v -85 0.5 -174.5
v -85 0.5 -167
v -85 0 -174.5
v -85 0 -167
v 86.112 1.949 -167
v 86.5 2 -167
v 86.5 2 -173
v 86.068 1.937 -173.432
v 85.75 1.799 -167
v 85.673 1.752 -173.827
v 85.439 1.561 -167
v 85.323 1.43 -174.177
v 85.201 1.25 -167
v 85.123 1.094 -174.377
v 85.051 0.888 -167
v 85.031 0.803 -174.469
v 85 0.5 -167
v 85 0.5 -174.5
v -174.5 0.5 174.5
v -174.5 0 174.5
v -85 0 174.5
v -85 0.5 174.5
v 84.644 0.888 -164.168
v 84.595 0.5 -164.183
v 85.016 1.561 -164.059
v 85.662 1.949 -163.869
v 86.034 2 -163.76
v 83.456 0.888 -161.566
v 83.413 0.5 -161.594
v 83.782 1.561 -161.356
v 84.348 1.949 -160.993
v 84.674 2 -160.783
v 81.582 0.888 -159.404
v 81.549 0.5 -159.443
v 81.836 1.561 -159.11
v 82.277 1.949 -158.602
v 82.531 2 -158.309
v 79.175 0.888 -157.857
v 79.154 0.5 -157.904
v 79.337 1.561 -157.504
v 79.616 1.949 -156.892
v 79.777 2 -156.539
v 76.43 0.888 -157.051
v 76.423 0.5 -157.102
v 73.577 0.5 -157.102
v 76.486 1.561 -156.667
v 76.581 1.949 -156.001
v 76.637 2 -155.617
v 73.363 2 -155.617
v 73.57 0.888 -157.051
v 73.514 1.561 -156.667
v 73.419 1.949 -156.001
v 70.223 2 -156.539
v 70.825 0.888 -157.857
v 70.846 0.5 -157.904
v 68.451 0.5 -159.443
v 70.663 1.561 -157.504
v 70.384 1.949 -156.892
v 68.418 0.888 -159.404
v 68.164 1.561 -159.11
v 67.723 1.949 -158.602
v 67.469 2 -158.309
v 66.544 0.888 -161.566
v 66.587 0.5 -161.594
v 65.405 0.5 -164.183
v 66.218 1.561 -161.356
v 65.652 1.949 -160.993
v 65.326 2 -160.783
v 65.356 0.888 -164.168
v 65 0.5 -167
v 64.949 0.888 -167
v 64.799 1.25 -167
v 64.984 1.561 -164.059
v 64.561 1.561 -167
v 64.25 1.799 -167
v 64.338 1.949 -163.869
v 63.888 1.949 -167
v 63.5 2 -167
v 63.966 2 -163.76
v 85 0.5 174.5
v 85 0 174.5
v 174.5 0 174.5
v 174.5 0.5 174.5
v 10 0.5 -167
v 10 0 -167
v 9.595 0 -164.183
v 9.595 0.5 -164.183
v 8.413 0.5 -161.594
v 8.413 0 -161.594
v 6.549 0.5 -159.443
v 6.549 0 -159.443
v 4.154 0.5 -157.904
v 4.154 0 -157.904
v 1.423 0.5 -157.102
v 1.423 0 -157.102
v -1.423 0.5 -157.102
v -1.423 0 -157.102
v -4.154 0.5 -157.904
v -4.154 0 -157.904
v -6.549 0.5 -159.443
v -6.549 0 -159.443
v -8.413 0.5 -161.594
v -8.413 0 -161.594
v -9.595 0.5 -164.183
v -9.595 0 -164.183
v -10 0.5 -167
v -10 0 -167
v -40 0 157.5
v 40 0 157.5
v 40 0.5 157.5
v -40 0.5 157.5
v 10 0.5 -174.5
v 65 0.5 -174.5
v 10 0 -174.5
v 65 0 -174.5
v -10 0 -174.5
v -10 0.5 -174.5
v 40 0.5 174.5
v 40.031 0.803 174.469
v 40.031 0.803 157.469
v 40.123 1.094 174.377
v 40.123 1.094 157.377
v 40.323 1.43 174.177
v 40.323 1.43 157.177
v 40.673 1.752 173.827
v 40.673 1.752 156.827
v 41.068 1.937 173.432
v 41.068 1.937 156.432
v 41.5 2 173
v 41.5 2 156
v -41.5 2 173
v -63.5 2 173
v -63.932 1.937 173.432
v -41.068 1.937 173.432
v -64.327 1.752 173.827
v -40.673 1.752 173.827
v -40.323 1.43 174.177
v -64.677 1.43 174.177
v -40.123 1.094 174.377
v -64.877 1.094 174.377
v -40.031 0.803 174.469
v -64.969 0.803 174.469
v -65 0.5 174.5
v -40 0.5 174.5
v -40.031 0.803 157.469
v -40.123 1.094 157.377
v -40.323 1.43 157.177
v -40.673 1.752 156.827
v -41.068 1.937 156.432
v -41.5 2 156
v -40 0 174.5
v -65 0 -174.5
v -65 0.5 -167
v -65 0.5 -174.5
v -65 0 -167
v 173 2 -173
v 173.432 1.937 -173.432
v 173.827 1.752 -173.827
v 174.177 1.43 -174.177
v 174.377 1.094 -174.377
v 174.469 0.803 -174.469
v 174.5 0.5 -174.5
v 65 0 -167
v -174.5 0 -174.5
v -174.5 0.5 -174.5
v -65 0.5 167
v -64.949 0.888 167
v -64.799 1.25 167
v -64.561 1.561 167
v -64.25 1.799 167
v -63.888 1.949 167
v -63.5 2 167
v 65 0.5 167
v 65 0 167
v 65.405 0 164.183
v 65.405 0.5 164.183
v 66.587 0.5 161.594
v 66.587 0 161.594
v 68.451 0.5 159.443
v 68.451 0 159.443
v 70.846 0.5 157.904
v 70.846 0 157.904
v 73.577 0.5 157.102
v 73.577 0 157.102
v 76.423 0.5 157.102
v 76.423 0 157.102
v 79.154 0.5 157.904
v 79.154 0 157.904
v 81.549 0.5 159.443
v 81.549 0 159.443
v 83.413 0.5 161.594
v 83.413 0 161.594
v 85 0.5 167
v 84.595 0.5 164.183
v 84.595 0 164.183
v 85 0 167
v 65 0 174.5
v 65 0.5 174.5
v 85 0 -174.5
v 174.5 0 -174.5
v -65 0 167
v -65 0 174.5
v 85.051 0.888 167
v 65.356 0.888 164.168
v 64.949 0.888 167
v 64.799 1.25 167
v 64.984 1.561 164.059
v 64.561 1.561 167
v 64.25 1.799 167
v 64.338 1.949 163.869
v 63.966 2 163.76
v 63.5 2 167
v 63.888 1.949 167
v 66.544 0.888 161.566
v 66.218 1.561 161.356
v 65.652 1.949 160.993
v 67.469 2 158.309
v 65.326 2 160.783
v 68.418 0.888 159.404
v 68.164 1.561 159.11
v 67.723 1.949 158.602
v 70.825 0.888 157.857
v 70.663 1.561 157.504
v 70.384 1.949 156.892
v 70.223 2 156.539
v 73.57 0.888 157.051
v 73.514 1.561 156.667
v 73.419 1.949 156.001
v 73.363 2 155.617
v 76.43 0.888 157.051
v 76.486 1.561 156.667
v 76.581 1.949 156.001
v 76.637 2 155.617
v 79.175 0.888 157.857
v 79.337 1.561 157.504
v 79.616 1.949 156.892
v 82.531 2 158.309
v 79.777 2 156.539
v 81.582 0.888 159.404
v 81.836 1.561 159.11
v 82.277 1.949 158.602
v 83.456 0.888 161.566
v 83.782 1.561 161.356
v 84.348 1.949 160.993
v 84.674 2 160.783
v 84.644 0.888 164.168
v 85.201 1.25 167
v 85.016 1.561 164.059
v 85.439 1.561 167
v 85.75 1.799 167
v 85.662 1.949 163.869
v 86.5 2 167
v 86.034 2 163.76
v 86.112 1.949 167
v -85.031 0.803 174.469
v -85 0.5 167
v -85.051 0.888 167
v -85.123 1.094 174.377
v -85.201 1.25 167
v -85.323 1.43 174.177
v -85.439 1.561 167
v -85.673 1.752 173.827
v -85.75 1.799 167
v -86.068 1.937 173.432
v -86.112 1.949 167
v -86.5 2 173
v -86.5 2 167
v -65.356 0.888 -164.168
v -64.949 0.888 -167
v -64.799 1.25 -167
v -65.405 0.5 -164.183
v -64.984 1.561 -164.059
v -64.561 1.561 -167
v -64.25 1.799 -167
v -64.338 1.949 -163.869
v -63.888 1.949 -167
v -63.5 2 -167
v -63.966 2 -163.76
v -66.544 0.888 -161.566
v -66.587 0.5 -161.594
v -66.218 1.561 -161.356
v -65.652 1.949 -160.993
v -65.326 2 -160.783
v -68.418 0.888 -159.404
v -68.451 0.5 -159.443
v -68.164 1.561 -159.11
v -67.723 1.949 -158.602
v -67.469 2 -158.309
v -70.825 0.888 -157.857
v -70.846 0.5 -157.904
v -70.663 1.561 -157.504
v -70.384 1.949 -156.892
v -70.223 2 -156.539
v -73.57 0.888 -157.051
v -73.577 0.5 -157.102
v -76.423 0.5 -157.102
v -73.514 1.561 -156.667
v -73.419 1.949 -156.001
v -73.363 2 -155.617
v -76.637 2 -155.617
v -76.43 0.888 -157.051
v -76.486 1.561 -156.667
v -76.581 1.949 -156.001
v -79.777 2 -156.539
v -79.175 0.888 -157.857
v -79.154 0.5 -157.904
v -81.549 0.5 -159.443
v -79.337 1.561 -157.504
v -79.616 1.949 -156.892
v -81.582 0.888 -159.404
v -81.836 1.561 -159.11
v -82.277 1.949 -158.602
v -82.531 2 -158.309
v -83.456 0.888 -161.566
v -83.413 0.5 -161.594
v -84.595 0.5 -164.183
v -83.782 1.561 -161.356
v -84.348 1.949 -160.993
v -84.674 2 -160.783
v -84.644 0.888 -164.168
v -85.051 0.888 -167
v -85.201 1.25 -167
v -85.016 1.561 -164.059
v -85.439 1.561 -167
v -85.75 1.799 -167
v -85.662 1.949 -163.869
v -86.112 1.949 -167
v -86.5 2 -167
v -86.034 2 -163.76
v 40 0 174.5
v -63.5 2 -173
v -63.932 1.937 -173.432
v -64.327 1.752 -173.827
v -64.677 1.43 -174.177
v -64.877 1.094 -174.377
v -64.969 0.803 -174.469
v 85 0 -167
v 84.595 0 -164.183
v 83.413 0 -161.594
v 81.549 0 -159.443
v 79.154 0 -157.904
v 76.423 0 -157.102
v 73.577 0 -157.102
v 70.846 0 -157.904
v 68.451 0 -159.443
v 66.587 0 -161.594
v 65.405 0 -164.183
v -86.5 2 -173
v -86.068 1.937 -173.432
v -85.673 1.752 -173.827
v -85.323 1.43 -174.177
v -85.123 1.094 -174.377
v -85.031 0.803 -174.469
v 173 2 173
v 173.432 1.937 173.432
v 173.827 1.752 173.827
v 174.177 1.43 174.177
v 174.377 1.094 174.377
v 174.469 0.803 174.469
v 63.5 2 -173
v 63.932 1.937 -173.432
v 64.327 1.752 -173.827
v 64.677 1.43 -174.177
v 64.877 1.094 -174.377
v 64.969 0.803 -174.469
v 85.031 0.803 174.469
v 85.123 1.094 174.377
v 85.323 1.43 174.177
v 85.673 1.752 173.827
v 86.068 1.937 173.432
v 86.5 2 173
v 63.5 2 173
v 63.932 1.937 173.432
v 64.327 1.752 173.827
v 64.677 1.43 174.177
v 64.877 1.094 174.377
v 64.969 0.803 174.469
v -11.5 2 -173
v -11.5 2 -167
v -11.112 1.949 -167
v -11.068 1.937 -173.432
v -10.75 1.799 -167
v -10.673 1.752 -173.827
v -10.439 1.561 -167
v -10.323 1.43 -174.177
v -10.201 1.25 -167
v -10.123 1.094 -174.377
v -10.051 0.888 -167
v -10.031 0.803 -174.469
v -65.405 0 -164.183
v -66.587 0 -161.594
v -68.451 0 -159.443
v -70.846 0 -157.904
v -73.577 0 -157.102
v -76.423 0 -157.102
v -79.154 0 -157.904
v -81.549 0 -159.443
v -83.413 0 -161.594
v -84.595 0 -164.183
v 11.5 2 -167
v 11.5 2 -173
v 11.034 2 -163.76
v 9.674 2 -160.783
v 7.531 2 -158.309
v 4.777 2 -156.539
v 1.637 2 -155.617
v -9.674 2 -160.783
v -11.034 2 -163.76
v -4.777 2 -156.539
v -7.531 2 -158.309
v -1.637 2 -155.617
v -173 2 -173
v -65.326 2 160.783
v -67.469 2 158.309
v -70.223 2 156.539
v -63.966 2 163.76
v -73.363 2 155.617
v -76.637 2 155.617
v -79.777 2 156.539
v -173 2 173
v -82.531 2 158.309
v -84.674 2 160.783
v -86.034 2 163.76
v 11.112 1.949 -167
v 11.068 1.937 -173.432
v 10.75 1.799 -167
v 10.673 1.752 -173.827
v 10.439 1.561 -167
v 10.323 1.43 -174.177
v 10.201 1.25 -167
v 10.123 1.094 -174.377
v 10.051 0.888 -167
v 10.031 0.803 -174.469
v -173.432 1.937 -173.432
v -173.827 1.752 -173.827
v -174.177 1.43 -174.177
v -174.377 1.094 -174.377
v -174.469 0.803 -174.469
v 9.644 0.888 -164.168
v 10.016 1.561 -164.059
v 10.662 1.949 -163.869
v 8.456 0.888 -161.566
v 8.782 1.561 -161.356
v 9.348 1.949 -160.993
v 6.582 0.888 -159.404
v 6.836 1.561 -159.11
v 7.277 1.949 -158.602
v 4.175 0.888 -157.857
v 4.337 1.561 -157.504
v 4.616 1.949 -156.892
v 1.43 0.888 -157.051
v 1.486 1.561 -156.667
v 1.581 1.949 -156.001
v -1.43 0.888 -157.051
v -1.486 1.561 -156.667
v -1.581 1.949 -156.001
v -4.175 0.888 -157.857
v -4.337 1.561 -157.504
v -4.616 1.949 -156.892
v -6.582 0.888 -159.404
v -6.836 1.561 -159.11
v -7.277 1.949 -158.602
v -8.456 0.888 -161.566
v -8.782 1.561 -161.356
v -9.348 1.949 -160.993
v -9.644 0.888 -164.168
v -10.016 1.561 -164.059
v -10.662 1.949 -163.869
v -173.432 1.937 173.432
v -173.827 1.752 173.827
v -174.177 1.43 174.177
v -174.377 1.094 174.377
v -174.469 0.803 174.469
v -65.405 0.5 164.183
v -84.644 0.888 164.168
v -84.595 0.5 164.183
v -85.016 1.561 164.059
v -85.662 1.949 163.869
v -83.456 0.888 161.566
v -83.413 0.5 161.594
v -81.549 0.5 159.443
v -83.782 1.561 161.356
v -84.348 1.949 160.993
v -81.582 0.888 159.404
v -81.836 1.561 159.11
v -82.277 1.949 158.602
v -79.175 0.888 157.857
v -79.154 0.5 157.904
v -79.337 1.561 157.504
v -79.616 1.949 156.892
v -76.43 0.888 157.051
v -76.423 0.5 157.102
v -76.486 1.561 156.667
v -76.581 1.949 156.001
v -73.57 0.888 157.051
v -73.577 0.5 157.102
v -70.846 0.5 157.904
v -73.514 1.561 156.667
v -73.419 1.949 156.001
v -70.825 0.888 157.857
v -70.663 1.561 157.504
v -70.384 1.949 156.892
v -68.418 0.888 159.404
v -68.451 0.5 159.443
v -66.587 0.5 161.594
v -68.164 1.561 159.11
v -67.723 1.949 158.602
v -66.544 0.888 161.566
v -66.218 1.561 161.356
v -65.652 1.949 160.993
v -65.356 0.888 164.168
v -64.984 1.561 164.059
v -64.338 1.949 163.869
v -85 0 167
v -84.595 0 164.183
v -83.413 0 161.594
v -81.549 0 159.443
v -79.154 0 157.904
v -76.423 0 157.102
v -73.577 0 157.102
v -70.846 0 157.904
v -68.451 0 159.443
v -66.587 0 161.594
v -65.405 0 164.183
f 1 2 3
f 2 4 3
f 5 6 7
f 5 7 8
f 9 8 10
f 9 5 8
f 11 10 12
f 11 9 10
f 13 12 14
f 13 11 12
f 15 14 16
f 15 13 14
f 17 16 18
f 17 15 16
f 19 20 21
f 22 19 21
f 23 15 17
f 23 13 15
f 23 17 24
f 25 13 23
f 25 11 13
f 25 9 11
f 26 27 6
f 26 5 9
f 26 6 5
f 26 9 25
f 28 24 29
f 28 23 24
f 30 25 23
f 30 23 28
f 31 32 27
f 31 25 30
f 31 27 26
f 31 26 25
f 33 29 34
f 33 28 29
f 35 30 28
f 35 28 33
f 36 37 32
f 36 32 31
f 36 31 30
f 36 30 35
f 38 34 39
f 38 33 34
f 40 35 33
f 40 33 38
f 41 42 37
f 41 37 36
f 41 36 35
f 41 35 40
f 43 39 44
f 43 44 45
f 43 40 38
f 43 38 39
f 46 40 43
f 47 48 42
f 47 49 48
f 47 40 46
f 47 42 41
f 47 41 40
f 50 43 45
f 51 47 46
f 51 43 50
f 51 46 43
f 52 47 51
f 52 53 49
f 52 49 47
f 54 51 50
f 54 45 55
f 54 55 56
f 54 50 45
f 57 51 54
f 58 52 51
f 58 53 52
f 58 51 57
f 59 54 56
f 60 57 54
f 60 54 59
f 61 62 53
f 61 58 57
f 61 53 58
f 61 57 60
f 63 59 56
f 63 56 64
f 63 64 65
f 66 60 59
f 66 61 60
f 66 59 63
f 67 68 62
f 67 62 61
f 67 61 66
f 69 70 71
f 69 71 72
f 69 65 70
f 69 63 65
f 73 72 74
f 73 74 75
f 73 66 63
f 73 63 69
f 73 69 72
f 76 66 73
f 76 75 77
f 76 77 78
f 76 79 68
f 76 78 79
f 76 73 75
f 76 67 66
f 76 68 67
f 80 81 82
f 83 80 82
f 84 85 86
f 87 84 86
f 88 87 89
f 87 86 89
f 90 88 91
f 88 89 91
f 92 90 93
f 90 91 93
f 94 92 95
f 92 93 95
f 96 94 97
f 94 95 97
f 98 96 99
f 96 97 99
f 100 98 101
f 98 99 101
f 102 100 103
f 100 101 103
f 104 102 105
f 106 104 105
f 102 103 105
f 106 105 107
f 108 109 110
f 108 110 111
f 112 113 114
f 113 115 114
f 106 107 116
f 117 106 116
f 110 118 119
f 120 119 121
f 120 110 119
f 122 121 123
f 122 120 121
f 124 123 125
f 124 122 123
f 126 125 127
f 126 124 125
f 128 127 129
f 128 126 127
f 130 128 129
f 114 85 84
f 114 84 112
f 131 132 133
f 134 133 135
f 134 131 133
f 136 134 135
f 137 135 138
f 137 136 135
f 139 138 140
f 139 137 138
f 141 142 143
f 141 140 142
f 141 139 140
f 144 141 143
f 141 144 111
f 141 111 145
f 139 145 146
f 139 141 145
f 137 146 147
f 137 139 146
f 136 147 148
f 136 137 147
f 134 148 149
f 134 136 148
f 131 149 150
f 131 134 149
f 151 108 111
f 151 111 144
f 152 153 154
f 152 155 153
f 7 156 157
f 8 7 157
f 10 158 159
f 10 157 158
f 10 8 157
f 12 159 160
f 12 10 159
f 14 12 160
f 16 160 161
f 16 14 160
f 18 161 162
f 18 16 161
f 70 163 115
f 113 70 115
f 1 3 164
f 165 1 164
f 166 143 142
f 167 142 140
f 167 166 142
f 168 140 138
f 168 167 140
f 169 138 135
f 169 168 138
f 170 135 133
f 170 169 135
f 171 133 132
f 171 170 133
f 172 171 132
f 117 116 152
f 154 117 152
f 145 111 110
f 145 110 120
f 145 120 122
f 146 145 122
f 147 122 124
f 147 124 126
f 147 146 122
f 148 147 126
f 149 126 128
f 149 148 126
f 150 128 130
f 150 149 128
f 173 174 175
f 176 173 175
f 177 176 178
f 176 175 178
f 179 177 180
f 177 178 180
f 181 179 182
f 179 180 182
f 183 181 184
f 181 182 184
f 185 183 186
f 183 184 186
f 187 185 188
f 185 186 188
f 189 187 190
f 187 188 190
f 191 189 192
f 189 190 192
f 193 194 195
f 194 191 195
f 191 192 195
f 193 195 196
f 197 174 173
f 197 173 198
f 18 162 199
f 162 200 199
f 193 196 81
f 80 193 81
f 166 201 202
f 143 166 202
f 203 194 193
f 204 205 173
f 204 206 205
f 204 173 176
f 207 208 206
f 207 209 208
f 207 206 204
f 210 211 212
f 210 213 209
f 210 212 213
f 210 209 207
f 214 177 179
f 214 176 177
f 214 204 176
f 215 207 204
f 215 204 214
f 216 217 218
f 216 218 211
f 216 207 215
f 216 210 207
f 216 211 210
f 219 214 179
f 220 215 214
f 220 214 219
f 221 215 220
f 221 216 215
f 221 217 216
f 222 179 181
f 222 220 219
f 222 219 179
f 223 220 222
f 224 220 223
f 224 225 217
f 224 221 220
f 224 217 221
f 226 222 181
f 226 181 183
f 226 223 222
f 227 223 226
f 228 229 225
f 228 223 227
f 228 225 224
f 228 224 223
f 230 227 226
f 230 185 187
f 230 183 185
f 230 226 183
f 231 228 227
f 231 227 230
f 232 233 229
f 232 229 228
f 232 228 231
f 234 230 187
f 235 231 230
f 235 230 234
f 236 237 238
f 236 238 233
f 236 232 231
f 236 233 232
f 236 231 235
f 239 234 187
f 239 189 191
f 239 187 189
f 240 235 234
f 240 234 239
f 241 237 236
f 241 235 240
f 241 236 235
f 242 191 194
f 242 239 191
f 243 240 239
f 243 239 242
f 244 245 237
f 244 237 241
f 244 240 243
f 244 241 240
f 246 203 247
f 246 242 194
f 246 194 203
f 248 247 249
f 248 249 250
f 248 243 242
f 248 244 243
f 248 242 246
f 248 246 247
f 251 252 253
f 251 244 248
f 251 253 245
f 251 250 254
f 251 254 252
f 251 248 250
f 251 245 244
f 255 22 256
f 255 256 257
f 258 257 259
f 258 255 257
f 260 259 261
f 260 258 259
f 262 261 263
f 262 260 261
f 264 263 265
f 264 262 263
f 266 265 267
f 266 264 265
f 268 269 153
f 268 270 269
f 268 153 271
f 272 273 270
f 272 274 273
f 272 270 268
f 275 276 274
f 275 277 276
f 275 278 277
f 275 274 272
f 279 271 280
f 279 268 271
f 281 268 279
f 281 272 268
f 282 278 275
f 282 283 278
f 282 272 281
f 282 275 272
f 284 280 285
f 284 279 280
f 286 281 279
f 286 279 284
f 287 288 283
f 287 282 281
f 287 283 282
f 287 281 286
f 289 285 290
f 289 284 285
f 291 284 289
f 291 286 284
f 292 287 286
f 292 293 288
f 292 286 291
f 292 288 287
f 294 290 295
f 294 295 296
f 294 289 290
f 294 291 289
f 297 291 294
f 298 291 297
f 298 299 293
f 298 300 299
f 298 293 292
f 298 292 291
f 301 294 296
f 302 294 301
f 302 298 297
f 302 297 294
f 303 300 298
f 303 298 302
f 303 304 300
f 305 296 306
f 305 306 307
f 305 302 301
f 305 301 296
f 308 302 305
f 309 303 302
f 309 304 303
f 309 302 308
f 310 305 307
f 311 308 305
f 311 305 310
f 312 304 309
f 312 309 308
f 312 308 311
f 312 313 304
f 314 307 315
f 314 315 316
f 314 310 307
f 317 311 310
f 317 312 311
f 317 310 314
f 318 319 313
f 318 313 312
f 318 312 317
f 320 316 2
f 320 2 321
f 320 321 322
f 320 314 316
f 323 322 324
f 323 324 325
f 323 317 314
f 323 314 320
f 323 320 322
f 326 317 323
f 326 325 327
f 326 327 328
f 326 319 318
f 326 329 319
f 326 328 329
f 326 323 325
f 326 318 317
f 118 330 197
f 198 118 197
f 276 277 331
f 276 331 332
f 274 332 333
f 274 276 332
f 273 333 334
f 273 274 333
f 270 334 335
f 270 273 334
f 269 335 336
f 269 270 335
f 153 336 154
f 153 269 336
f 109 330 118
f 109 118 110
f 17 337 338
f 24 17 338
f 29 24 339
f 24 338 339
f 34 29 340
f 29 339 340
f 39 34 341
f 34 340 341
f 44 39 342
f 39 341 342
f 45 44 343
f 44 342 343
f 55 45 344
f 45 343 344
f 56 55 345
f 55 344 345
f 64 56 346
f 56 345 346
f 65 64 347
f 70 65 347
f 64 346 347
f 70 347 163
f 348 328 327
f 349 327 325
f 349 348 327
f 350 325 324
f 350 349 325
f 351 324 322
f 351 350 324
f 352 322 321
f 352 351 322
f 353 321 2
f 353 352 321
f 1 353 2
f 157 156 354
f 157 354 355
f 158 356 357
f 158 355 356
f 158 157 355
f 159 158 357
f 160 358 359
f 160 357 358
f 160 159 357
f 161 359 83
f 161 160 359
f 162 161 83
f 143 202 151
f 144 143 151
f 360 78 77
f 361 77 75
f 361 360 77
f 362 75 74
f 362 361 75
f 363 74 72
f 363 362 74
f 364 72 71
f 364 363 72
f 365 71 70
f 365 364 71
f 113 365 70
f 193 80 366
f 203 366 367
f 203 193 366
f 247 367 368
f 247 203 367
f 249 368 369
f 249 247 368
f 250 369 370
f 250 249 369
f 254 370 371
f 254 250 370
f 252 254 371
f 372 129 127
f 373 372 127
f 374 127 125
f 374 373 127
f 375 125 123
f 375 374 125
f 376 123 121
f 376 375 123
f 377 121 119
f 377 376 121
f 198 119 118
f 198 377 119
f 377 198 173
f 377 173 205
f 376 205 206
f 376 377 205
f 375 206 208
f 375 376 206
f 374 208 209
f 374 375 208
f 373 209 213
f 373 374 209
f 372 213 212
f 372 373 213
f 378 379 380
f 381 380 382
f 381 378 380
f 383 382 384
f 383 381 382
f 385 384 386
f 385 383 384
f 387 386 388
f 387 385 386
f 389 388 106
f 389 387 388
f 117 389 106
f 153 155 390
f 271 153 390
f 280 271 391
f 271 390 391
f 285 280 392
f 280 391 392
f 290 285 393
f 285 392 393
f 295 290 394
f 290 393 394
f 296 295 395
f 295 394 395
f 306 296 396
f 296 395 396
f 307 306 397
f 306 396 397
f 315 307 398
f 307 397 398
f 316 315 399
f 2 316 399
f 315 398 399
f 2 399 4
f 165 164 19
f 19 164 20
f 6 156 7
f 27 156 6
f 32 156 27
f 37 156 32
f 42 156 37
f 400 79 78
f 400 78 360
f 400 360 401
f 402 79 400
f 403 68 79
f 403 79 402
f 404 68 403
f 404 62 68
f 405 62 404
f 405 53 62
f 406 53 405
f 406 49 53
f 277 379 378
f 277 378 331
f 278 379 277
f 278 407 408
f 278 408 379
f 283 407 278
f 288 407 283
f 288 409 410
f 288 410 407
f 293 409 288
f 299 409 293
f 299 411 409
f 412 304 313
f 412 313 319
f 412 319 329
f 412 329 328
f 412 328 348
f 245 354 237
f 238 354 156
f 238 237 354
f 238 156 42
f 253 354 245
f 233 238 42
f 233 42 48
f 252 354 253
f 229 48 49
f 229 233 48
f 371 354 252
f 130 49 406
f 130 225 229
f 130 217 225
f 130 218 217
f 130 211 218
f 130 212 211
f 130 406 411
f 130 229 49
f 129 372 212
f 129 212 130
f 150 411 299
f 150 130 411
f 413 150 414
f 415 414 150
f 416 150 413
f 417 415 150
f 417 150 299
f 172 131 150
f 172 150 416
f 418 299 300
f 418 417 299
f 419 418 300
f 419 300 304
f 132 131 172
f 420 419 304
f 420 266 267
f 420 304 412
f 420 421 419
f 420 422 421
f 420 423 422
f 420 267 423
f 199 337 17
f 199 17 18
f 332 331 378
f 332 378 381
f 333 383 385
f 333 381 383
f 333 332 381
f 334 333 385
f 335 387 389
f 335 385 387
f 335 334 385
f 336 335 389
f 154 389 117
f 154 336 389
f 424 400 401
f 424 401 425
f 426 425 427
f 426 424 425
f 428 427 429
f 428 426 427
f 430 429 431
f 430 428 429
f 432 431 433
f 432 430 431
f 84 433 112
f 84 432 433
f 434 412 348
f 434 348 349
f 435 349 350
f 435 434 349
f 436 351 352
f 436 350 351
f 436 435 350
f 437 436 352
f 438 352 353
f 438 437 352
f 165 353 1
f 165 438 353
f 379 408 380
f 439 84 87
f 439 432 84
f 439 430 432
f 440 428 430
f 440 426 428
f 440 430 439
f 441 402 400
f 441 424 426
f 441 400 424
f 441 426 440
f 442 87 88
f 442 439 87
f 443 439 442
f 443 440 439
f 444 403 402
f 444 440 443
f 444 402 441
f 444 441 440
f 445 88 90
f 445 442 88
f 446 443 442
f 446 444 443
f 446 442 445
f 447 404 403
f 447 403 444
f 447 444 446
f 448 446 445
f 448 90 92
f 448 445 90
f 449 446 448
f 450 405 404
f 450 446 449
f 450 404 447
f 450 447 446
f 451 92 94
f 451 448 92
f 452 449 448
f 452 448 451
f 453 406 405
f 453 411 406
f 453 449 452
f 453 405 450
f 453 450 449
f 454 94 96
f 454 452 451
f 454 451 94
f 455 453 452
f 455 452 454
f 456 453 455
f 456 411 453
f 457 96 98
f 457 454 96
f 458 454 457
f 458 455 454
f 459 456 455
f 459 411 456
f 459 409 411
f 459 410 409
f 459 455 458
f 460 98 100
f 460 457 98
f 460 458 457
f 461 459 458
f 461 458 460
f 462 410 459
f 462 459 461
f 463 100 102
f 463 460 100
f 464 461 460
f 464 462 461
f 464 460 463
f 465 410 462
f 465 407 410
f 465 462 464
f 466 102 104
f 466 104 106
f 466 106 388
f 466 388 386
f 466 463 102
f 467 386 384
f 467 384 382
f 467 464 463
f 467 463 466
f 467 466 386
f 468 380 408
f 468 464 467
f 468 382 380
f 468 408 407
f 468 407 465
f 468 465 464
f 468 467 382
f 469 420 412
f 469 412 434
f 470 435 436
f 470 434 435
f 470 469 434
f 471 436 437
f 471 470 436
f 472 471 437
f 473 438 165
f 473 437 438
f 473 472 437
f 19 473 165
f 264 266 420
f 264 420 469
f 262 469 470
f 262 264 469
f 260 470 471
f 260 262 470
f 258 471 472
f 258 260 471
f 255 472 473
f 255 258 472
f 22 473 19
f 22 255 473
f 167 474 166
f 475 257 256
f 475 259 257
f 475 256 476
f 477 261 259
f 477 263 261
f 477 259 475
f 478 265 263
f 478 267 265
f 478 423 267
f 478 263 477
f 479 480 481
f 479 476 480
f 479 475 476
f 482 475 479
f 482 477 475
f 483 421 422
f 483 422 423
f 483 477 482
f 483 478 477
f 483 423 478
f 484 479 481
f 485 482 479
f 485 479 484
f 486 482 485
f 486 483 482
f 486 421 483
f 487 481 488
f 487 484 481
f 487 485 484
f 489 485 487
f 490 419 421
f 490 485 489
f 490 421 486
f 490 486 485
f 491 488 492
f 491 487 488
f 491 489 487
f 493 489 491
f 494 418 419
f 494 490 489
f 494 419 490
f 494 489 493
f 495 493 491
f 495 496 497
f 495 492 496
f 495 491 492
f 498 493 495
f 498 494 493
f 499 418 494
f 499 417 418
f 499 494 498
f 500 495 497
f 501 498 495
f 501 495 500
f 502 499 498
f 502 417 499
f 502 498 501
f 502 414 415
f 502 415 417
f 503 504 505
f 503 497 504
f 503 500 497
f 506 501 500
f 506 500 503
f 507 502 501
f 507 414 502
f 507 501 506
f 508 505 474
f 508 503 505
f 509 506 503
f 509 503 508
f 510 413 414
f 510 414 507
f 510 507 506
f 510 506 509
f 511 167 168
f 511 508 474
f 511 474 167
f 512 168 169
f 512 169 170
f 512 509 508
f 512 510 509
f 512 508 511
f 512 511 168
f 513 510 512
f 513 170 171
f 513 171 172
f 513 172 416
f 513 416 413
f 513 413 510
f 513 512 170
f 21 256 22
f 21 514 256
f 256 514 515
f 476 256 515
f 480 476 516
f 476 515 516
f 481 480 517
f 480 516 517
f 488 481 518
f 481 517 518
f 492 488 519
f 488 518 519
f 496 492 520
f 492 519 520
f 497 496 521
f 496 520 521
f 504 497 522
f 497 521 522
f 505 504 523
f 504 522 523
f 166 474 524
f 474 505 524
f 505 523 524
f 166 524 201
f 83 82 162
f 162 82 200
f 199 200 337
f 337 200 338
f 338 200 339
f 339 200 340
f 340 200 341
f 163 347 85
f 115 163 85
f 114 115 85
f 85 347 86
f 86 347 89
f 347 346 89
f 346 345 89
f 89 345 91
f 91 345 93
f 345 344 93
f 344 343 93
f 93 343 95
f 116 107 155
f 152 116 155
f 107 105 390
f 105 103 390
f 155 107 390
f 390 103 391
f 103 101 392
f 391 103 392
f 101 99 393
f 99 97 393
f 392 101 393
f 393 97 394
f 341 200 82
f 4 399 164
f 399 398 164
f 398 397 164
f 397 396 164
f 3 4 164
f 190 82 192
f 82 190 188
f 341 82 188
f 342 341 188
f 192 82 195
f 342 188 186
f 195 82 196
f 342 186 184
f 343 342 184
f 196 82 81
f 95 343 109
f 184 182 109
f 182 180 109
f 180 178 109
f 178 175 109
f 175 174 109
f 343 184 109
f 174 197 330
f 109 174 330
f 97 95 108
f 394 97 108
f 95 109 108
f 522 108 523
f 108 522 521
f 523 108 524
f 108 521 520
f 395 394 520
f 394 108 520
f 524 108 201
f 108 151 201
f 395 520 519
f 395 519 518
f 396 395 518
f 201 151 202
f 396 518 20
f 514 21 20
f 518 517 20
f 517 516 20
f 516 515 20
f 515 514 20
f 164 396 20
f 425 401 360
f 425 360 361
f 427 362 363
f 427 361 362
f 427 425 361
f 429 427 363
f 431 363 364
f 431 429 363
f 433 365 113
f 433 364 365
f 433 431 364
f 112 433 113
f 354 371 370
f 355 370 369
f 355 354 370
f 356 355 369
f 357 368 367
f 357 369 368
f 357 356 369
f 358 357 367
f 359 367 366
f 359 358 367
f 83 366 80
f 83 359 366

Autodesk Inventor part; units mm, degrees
ref_plane "YZ Plane" through (0, 0, 0) normal (1, 0, 0) x (0, 1, 0)
ref_plane "XZ Plane" through (0, 0, 0) normal (0, 1, 0) x (-1, 0, 0)
ref_plane "XY Plane" through (0, 0, 0) normal (0, 0, 1) x (1, 0, 0)
sketch "Skizze1" plane through (0, 0, 0) normal (0, 1, 0) x (-1, 0, 0)
  line L0 (174.5, 174.5) -> (-174.5, 174.5)
  line L1 (-174.5, 174.5) -> (-174.5, -174.5)
  line L2 (-174.5, -174.5) -> (174.5, -174.5)
  line L3 (174.5, -174.5) -> (174.5, 174.5)
  line L4 (174.5, 174.5) -> (-174.5, -174.5) construction
  line L5 (-174.5, 174.5) -> (174.5, -174.5) construction
  line L6 (244.3, 0) -> (-244.3, 0) construction
  line L7 (0, -244.3) -> (0, 244.3) construction
  arc A0 (10, -167) -> (-10, -167) centre (0, -167) ccw
  arc A1 (85, -167) -> (65, -167) centre (75, -167) ccw
  arc A2 (-65, -167) -> (-85, -167) centre (-75, -167) ccw
  line L8 (85, -167) -> (85, -174.5)
  line L9 (65, -167) -> (65, -174.5)
  line L10 (10, -167) -> (10, -174.5)
  line L11 (-10, -167) -> (-10, -174.5)
  line L12 (-65, -167) -> (-65, -174.5)
  line L13 (-85, -167) -> (-85, -174.5)
  line L14 (-65, -174.5) -> (-85, -174.5)
  line L15 (10, -174.5) -> (-10, -174.5)
  line L16 (85, -174.5) -> (65, -174.5)
  line L17 (40, 174.5) -> (-40, 174.5)
  line L18 (-40, 174.5) -> (-40, 157.5)
  line L19 (-40, 157.5) -> (40, 157.5)
  line L20 (40, 157.5) -> (40, 174.5)
  arc A3 (65, 167) -> (85, 167) centre (75, 167) ccw
  arc A4 (-85, 167) -> (-65, 167) centre (-75, 167) ccw
  line L21 (85, 167) -> (85, 174.5)
  line L22 (65, 167) -> (65, 174.5)
  line L23 (-65, 167) -> (-65, 174.5)
  line L24 (-85, 167) -> (-85, 174.5)
  line L25 (-65, 174.5) -> (-85, 174.5)
  line L26 (85, 174.5) -> (65, 174.5)
  point P0 (0, 0)
  dimension "d0" = 349
  dimension "d1" = 349
  dimension "d2" = 20
  dimension "d3" = 17.5
  dimension "d4" = 150
  dimension "d5" = 17
  dimension "d6" = 80
extrude "Extrusion1" add sketch "Skizze1" along normal blind 2 contours L3 L2 L8 A1 L9 L10 A0 L11 L12 A2 L13 L1 L0 L24 A4 L23 L18 L19 L20 L22 A3 L21
fillet "Rundung1" radius 1.5 28 edges at (-129.75, 2, 174.5) (-75, 2, 157) (-65, 2, 170.75) (-85, 2, 170.75) (-52.5, 2, 174.5) (-40, 2, 166) (0, 2, 157.5) (40, 2, 166) (52.5, 2, 174.5) (75, 2, 157) (85, 2, 170.75) (65, 2, 170.75) (129.75, 2, 174.5) (174.5, 2, 0) (129.75, 2, -174.5) (65, 2, -170.75) (85, 2, -170.75) (75, 2, -157) (37.5, 2, -174.5) (-10, 2, -170.75) (10, 2, -170.75) (0, 2, -157) (-37.5, 2, -174.5) (-85, 2, -170.75) (-65, 2, -170.75) (-75, 2, -157) (-129.75, 2, -174.5) (-174.5, 2, 0)
properties part number "Silicon-Heater (350mm)" material "Gummi, Silikon"
